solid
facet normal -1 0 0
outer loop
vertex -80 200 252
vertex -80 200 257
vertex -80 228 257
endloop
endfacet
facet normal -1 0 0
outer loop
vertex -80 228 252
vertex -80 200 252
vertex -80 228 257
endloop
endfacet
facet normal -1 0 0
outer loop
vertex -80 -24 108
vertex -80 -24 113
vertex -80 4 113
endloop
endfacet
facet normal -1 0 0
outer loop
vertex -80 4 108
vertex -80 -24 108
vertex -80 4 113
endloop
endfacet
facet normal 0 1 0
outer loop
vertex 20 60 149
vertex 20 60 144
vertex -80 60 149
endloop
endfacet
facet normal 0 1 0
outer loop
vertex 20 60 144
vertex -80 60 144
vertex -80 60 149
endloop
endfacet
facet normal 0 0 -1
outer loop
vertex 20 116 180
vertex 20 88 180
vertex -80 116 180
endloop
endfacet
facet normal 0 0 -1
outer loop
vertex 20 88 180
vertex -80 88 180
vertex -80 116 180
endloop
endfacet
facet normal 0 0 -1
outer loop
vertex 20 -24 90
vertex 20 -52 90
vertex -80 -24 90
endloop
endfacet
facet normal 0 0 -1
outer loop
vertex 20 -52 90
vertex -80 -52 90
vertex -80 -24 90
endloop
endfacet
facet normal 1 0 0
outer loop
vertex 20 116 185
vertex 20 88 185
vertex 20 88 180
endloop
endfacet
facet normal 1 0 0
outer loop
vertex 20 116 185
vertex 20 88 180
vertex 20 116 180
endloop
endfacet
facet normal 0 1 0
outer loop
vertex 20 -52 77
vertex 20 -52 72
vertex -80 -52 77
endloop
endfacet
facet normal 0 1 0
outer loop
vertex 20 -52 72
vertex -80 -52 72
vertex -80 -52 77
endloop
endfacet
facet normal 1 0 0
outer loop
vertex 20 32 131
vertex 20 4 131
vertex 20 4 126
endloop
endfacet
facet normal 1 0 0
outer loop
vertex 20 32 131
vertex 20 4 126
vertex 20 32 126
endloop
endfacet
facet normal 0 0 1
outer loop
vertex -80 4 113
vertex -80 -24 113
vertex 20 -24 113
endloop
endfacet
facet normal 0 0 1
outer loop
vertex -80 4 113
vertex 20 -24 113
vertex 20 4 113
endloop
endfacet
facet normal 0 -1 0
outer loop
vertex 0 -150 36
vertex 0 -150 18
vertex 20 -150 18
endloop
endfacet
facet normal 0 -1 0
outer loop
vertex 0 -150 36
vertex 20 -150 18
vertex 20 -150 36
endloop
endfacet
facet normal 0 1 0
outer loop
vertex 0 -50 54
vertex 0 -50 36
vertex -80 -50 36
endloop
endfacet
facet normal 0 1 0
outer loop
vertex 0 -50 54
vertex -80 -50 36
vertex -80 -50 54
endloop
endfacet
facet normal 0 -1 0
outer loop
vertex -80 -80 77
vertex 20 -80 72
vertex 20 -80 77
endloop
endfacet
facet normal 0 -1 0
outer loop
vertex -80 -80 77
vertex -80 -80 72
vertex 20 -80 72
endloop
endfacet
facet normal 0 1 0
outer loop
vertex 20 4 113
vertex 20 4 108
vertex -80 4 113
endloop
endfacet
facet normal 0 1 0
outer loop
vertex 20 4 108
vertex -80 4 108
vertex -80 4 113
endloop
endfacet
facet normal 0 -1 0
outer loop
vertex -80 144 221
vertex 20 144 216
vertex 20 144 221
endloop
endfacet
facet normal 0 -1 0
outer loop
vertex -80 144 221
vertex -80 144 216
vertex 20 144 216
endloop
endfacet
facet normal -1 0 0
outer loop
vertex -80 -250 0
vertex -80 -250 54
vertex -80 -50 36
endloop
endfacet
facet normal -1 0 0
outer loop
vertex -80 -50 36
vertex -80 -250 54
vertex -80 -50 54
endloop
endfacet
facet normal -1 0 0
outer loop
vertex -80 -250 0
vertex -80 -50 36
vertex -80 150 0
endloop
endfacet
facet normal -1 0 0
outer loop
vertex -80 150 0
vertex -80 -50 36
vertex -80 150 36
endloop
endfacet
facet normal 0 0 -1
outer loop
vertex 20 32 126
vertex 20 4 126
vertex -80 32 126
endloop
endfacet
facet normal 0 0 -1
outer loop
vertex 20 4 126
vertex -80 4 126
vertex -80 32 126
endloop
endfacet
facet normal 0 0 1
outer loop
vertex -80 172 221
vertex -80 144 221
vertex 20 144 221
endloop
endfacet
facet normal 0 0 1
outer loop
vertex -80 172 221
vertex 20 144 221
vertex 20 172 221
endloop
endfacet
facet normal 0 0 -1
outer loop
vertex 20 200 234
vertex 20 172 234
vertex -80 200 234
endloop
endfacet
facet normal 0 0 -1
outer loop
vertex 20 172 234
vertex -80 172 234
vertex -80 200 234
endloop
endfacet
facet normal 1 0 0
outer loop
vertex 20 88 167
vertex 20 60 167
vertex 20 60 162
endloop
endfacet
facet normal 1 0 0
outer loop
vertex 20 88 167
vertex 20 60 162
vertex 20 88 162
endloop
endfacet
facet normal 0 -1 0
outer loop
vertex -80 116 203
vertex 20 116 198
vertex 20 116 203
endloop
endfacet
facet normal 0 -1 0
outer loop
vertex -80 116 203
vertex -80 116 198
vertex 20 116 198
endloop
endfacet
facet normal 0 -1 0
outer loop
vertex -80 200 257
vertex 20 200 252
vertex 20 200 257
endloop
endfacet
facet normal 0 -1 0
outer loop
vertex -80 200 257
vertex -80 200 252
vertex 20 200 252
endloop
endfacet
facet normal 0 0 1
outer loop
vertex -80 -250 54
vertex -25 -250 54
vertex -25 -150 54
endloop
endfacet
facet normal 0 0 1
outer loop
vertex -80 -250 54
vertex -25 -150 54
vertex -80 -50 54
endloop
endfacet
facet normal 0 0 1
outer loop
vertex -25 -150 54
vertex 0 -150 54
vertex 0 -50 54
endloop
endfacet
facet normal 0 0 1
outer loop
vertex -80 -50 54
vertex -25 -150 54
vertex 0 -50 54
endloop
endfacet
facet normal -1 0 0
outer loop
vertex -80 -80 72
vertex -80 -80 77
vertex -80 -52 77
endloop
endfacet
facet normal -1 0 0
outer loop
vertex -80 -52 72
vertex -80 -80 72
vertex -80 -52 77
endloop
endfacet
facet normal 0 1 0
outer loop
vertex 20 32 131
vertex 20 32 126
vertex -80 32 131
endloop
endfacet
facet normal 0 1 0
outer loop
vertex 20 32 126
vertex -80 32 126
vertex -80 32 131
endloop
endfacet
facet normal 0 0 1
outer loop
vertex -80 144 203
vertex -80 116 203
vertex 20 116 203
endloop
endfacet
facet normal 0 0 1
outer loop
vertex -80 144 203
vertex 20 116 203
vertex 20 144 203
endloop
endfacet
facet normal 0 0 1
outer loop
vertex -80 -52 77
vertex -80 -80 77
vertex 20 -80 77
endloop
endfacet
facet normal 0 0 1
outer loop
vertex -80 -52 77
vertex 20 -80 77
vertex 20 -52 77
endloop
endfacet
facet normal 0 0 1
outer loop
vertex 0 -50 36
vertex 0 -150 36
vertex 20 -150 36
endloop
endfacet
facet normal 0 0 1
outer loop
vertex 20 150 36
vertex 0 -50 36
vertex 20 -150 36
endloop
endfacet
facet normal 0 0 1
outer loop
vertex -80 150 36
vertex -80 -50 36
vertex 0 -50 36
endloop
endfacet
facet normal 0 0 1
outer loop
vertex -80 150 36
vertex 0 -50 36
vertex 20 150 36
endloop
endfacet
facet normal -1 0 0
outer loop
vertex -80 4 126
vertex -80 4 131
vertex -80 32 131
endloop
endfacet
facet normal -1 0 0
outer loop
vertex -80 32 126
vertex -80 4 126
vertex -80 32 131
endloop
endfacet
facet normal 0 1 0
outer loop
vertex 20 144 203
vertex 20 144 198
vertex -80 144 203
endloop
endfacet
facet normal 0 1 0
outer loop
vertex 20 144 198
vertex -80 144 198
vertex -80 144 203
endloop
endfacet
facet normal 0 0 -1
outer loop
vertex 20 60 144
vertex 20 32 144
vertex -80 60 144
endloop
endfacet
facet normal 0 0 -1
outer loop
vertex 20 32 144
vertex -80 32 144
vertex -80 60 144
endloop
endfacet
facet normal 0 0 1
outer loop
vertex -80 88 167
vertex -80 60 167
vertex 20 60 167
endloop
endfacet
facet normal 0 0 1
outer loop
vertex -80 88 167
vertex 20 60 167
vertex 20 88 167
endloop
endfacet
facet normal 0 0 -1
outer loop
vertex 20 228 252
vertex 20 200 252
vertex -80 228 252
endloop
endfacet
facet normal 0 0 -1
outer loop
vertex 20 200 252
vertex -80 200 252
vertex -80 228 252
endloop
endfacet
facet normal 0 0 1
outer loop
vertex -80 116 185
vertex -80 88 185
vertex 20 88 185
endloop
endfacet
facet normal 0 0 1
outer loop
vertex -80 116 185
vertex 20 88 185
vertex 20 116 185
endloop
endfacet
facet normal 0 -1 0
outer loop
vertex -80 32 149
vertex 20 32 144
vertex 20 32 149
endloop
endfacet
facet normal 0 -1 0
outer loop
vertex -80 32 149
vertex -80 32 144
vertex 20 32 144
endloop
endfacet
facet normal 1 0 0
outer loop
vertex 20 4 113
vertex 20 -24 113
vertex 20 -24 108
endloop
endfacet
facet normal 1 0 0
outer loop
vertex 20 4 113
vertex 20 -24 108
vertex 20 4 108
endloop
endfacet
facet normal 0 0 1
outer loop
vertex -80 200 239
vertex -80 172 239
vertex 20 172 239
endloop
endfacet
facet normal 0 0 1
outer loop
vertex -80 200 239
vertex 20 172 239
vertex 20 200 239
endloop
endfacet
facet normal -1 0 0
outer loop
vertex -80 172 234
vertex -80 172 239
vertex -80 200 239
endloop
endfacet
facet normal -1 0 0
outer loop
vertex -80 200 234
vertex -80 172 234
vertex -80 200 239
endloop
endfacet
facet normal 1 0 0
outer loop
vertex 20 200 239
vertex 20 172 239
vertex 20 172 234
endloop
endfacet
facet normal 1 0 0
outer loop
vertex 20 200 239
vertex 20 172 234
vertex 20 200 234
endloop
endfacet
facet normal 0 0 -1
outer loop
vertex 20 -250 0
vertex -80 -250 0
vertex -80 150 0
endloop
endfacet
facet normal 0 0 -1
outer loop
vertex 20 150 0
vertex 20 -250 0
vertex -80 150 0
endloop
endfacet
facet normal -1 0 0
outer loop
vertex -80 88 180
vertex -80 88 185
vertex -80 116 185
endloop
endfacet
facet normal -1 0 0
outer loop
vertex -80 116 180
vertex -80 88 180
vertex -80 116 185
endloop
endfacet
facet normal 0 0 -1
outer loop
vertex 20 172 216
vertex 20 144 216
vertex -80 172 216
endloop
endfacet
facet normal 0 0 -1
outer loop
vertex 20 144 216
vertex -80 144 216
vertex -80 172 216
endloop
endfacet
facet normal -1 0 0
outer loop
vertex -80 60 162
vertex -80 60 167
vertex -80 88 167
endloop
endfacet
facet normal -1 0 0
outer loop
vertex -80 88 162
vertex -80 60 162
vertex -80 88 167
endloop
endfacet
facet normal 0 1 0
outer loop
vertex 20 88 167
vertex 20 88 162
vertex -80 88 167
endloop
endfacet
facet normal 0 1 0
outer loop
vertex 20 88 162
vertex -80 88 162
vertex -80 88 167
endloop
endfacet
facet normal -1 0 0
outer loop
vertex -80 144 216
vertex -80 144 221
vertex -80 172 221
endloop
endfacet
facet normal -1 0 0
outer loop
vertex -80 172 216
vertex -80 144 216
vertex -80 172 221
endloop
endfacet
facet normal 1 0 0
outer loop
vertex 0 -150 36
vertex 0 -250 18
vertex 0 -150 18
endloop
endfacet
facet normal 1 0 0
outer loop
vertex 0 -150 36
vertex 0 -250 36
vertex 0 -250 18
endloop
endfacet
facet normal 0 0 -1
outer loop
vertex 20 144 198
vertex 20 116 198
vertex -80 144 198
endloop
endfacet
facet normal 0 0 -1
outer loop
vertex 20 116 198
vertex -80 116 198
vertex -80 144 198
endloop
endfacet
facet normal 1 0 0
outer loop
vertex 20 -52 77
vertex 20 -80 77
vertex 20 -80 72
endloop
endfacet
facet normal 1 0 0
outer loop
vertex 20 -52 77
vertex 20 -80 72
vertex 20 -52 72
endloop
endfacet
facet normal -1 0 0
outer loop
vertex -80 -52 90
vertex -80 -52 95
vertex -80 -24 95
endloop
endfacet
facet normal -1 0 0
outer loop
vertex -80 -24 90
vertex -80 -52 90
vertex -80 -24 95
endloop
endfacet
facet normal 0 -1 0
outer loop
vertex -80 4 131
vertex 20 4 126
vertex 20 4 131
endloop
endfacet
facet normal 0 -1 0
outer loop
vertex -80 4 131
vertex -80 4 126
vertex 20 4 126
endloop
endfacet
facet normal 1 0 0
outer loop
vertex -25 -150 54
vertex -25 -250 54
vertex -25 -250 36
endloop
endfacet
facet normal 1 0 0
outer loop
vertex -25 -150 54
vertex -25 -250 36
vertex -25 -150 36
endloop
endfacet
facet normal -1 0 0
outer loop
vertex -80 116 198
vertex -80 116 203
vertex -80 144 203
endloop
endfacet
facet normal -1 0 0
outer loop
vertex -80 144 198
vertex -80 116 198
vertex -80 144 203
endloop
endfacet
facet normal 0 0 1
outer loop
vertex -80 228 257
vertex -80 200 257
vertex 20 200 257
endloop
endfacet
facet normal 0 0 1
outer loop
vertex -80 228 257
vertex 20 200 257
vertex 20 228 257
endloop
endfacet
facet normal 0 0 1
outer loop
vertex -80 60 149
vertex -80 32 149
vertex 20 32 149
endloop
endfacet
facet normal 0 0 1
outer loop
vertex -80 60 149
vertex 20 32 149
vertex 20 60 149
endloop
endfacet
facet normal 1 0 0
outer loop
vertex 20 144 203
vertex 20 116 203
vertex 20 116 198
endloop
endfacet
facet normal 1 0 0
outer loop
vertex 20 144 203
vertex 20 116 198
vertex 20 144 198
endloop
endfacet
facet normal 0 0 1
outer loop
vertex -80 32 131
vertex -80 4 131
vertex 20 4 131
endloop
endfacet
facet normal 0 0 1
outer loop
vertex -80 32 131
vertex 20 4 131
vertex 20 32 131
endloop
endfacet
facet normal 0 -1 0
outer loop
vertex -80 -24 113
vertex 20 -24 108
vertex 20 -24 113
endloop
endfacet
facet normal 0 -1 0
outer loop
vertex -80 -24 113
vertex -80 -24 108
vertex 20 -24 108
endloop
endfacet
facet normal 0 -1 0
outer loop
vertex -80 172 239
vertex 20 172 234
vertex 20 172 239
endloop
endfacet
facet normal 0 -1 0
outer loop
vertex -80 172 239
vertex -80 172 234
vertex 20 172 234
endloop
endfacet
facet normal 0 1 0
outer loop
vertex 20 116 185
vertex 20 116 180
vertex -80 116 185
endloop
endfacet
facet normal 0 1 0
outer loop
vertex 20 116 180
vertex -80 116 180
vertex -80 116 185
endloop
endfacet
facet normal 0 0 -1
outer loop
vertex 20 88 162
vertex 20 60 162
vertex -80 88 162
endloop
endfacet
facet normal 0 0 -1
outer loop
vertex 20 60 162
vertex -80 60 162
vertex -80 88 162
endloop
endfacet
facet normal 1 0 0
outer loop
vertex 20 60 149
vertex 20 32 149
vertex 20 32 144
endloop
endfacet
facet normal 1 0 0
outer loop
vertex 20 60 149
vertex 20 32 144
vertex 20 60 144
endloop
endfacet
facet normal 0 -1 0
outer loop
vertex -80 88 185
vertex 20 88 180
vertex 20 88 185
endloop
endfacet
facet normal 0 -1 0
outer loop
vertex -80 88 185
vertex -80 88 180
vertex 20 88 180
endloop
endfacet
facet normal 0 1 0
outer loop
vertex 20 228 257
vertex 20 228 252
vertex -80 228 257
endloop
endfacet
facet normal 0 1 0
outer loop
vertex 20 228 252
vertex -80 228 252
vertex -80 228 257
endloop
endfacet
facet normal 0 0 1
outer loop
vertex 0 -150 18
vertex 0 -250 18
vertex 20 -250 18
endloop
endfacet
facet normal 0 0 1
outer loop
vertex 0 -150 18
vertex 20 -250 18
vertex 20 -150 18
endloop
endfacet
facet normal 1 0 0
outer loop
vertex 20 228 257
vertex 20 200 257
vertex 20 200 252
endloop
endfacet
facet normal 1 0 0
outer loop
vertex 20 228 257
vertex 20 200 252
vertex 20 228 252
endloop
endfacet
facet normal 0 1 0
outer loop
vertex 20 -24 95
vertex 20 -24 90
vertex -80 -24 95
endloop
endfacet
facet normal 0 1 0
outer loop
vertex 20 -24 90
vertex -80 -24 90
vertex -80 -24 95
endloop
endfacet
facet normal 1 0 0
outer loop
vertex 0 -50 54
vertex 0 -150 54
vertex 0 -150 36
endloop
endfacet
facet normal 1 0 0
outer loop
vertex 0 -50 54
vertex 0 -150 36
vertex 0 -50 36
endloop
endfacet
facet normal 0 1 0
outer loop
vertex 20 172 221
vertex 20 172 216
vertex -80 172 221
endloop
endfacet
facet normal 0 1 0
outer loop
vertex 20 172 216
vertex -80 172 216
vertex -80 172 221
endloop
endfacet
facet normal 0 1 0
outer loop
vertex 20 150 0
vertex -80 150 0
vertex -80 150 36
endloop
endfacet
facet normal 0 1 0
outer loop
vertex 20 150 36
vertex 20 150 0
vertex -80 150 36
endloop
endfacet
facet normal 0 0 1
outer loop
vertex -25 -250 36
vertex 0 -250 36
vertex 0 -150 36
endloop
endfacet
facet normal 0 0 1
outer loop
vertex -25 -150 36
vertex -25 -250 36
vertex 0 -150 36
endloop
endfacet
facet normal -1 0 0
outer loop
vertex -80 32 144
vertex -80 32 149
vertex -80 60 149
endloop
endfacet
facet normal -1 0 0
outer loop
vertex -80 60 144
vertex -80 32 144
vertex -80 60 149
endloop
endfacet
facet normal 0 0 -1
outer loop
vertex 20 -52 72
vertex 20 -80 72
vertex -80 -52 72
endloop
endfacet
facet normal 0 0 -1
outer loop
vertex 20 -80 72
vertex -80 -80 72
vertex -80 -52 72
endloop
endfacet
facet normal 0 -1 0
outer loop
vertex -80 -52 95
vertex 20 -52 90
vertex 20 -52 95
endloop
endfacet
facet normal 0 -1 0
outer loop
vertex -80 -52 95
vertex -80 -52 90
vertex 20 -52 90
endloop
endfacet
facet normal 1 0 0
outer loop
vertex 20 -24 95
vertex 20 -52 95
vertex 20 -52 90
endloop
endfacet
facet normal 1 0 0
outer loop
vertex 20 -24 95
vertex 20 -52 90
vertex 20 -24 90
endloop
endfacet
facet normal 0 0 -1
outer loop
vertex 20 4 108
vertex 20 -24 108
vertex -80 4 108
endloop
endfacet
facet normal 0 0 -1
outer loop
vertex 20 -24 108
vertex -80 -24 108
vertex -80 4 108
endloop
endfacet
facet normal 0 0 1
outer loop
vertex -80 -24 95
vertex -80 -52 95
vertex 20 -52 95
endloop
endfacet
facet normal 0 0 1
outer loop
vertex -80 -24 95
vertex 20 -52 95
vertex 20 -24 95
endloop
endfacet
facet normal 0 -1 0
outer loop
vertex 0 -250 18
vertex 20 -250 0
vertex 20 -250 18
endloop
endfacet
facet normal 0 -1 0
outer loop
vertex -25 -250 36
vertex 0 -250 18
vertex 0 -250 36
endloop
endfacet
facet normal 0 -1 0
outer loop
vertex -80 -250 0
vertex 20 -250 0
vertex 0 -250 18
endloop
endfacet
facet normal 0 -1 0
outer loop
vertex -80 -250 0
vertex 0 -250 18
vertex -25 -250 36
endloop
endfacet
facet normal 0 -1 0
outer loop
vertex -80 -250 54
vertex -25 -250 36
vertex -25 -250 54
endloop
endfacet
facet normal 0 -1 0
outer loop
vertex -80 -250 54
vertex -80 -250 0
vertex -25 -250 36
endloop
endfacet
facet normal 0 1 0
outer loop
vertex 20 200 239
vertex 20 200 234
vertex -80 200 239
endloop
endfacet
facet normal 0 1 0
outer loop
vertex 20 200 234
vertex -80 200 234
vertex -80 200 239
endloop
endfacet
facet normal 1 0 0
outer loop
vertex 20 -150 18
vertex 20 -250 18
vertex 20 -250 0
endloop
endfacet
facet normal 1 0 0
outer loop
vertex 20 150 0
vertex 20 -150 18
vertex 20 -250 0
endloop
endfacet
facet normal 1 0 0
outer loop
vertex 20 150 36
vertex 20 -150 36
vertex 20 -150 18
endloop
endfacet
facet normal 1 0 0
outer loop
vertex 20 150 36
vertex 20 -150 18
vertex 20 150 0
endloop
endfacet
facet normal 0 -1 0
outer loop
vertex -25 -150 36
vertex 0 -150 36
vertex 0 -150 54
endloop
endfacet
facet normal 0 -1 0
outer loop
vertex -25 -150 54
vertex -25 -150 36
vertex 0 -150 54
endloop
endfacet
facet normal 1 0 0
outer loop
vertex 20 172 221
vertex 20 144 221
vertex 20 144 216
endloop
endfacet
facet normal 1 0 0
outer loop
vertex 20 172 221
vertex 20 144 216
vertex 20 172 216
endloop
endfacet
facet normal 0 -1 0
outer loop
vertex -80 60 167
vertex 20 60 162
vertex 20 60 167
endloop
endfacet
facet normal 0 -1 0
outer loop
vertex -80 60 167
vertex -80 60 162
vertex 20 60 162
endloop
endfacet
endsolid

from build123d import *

# Parameters (mm, degrees)
F0_W          = 200
F0_H          = 18
F1_DEPTH      = 80
F2_W          = 100
F2_H          = 18
F3_DEPTH      = 20
F4_W          = 28
F4_H          = 5
F5_DEPTH      = 80
F5_DEPTH_BACK = 20
F6_W          = 100
F6_H          = 18
F7_DEPTH      = 25
F8_W          = 300
F8_H          = 36
F9_DEPTH      = 20


with BuildPart() as f1:
    # F0 (on Right) → F1 (new body)
    with BuildSketch(Plane.YZ):
        Polygon((-250, 0), (0, 0), (150, 0), (150, 36), (-50, 36), (-250, 36), align=None)
        with Locations((-150, 45)):
            Rectangle(F0_W, F0_H)
    extrude(amount=-F1_DEPTH)

    # F2 (on face) → F3 (join)
    with BuildSketch(Plane.YZ):
        with Locations((-200, 9)):
            Rectangle(F2_W, F2_H)
    extrude(amount=F3_DEPTH)

    # F6 (on Right) → F7 (cut)
    with BuildSketch(Plane.YZ):
        with Locations((-200, 45)):
            Rectangle(F6_W, F6_H)
    extrude(amount=-F7_DEPTH, mode=Mode.SUBTRACT)

    # F8 (on Right) → F9 (join)
    with BuildSketch(Plane.YZ):
        with Locations((0, 18)):
            Rectangle(F8_W, F8_H)
    extrude(amount=F9_DEPTH)


with BuildPart() as f5:
    # F4 (on Right) → F5 (new body, two sides)
    with BuildSketch(Plane.YZ) as f5_sk:
        with Locations((-66, 74.5)):
            Rectangle(F4_W, F4_H)
    extrude(amount=-F5_DEPTH)
    extrude(f5_sk.sketch, amount=F5_DEPTH_BACK)


with BuildPart() as f5b:
    # F4 (on Right) → F5, piece 2 (new body, two sides)
    with BuildSketch(Plane.YZ) as f5_2_sk:
        with Locations((-38, 92.5)):
            Rectangle(F4_W, F4_H)
    extrude(amount=-F5_DEPTH)
    extrude(f5_2_sk.sketch, amount=F5_DEPTH_BACK)


with BuildPart() as f5c:
    # F4 (on Right) → F5, piece 3 (new body, two sides)
    with BuildSketch(Plane.YZ) as f5_3_sk:
        with Locations((-10, 110.5)):
            Rectangle(F4_W, F4_H)
    extrude(amount=-F5_DEPTH)
    extrude(f5_3_sk.sketch, amount=F5_DEPTH_BACK)


with BuildPart() as f5d:
    # F4 (on Right) → F5, piece 4 (new body, two sides)
    with BuildSketch(Plane.YZ) as f5_4_sk:
        with Locations((18, 128.5)):
            Rectangle(F4_W, F4_H)
    extrude(amount=-F5_DEPTH)
    extrude(f5_4_sk.sketch, amount=F5_DEPTH_BACK)


with BuildPart() as f5e:
    # F4 (on Right) → F5, piece 5 (new body, two sides)
    with BuildSketch(Plane.YZ) as f5_5_sk:
        with Locations((46, 146.5)):
            Rectangle(F4_W, F4_H)
    extrude(amount=-F5_DEPTH)
    extrude(f5_5_sk.sketch, amount=F5_DEPTH_BACK)


with BuildPart() as f5f:
    # F4 (on Right) → F5, piece 6 (new body, two sides)
    with BuildSketch(Plane.YZ) as f5_6_sk:
        with Locations((74, 164.5)):
            Rectangle(F4_W, F4_H)
    extrude(amount=-F5_DEPTH)
    extrude(f5_6_sk.sketch, amount=F5_DEPTH_BACK)


with BuildPart() as f5g:
    # F4 (on Right) → F5, piece 7 (new body, two sides)
    with BuildSketch(Plane.YZ) as f5_7_sk:
        with Locations((102, 182.5)):
            Rectangle(F4_W, F4_H)
    extrude(amount=-F5_DEPTH)
    extrude(f5_7_sk.sketch, amount=F5_DEPTH_BACK)


with BuildPart() as f5h:
    # F4 (on Right) → F5, piece 8 (new body, two sides)
    with BuildSketch(Plane.YZ) as f5_8_sk:
        with Locations((130, 200.5)):
            Rectangle(F4_W, F4_H)
    extrude(amount=-F5_DEPTH)
    extrude(f5_8_sk.sketch, amount=F5_DEPTH_BACK)


with BuildPart() as f5i:
    # F4 (on Right) → F5, piece 9 (new body, two sides)
    with BuildSketch(Plane.YZ) as f5_9_sk:
        with Locations((158, 218.5)):
            Rectangle(F4_W, F4_H)
    extrude(amount=-F5_DEPTH)
    extrude(f5_9_sk.sketch, amount=F5_DEPTH_BACK)


with BuildPart() as f5j:
    # F4 (on Right) → F5, piece 10 (new body, two sides)
    with BuildSketch(Plane.YZ) as f5_10_sk:
        with Locations((186, 236.5)):
            Rectangle(F4_W, F4_H)
    extrude(amount=-F5_DEPTH)
    extrude(f5_10_sk.sketch, amount=F5_DEPTH_BACK)


with BuildPart() as f5k:
    # F4 (on Right) → F5, piece 11 (new body, two sides)
    with BuildSketch(Plane.YZ) as f5_11_sk:
        with Locations((214, 254.5)):
            Rectangle(F4_W, F4_H)
    extrude(amount=-F5_DEPTH)
    extrude(f5_11_sk.sketch, amount=F5_DEPTH_BACK)


solid = Compound([f1.part, f5.part, f5b.part, f5c.part, f5d.part, f5e.part, f5f.part, f5g.part, f5h.part, f5i.part, f5j.part, f5k.part])
